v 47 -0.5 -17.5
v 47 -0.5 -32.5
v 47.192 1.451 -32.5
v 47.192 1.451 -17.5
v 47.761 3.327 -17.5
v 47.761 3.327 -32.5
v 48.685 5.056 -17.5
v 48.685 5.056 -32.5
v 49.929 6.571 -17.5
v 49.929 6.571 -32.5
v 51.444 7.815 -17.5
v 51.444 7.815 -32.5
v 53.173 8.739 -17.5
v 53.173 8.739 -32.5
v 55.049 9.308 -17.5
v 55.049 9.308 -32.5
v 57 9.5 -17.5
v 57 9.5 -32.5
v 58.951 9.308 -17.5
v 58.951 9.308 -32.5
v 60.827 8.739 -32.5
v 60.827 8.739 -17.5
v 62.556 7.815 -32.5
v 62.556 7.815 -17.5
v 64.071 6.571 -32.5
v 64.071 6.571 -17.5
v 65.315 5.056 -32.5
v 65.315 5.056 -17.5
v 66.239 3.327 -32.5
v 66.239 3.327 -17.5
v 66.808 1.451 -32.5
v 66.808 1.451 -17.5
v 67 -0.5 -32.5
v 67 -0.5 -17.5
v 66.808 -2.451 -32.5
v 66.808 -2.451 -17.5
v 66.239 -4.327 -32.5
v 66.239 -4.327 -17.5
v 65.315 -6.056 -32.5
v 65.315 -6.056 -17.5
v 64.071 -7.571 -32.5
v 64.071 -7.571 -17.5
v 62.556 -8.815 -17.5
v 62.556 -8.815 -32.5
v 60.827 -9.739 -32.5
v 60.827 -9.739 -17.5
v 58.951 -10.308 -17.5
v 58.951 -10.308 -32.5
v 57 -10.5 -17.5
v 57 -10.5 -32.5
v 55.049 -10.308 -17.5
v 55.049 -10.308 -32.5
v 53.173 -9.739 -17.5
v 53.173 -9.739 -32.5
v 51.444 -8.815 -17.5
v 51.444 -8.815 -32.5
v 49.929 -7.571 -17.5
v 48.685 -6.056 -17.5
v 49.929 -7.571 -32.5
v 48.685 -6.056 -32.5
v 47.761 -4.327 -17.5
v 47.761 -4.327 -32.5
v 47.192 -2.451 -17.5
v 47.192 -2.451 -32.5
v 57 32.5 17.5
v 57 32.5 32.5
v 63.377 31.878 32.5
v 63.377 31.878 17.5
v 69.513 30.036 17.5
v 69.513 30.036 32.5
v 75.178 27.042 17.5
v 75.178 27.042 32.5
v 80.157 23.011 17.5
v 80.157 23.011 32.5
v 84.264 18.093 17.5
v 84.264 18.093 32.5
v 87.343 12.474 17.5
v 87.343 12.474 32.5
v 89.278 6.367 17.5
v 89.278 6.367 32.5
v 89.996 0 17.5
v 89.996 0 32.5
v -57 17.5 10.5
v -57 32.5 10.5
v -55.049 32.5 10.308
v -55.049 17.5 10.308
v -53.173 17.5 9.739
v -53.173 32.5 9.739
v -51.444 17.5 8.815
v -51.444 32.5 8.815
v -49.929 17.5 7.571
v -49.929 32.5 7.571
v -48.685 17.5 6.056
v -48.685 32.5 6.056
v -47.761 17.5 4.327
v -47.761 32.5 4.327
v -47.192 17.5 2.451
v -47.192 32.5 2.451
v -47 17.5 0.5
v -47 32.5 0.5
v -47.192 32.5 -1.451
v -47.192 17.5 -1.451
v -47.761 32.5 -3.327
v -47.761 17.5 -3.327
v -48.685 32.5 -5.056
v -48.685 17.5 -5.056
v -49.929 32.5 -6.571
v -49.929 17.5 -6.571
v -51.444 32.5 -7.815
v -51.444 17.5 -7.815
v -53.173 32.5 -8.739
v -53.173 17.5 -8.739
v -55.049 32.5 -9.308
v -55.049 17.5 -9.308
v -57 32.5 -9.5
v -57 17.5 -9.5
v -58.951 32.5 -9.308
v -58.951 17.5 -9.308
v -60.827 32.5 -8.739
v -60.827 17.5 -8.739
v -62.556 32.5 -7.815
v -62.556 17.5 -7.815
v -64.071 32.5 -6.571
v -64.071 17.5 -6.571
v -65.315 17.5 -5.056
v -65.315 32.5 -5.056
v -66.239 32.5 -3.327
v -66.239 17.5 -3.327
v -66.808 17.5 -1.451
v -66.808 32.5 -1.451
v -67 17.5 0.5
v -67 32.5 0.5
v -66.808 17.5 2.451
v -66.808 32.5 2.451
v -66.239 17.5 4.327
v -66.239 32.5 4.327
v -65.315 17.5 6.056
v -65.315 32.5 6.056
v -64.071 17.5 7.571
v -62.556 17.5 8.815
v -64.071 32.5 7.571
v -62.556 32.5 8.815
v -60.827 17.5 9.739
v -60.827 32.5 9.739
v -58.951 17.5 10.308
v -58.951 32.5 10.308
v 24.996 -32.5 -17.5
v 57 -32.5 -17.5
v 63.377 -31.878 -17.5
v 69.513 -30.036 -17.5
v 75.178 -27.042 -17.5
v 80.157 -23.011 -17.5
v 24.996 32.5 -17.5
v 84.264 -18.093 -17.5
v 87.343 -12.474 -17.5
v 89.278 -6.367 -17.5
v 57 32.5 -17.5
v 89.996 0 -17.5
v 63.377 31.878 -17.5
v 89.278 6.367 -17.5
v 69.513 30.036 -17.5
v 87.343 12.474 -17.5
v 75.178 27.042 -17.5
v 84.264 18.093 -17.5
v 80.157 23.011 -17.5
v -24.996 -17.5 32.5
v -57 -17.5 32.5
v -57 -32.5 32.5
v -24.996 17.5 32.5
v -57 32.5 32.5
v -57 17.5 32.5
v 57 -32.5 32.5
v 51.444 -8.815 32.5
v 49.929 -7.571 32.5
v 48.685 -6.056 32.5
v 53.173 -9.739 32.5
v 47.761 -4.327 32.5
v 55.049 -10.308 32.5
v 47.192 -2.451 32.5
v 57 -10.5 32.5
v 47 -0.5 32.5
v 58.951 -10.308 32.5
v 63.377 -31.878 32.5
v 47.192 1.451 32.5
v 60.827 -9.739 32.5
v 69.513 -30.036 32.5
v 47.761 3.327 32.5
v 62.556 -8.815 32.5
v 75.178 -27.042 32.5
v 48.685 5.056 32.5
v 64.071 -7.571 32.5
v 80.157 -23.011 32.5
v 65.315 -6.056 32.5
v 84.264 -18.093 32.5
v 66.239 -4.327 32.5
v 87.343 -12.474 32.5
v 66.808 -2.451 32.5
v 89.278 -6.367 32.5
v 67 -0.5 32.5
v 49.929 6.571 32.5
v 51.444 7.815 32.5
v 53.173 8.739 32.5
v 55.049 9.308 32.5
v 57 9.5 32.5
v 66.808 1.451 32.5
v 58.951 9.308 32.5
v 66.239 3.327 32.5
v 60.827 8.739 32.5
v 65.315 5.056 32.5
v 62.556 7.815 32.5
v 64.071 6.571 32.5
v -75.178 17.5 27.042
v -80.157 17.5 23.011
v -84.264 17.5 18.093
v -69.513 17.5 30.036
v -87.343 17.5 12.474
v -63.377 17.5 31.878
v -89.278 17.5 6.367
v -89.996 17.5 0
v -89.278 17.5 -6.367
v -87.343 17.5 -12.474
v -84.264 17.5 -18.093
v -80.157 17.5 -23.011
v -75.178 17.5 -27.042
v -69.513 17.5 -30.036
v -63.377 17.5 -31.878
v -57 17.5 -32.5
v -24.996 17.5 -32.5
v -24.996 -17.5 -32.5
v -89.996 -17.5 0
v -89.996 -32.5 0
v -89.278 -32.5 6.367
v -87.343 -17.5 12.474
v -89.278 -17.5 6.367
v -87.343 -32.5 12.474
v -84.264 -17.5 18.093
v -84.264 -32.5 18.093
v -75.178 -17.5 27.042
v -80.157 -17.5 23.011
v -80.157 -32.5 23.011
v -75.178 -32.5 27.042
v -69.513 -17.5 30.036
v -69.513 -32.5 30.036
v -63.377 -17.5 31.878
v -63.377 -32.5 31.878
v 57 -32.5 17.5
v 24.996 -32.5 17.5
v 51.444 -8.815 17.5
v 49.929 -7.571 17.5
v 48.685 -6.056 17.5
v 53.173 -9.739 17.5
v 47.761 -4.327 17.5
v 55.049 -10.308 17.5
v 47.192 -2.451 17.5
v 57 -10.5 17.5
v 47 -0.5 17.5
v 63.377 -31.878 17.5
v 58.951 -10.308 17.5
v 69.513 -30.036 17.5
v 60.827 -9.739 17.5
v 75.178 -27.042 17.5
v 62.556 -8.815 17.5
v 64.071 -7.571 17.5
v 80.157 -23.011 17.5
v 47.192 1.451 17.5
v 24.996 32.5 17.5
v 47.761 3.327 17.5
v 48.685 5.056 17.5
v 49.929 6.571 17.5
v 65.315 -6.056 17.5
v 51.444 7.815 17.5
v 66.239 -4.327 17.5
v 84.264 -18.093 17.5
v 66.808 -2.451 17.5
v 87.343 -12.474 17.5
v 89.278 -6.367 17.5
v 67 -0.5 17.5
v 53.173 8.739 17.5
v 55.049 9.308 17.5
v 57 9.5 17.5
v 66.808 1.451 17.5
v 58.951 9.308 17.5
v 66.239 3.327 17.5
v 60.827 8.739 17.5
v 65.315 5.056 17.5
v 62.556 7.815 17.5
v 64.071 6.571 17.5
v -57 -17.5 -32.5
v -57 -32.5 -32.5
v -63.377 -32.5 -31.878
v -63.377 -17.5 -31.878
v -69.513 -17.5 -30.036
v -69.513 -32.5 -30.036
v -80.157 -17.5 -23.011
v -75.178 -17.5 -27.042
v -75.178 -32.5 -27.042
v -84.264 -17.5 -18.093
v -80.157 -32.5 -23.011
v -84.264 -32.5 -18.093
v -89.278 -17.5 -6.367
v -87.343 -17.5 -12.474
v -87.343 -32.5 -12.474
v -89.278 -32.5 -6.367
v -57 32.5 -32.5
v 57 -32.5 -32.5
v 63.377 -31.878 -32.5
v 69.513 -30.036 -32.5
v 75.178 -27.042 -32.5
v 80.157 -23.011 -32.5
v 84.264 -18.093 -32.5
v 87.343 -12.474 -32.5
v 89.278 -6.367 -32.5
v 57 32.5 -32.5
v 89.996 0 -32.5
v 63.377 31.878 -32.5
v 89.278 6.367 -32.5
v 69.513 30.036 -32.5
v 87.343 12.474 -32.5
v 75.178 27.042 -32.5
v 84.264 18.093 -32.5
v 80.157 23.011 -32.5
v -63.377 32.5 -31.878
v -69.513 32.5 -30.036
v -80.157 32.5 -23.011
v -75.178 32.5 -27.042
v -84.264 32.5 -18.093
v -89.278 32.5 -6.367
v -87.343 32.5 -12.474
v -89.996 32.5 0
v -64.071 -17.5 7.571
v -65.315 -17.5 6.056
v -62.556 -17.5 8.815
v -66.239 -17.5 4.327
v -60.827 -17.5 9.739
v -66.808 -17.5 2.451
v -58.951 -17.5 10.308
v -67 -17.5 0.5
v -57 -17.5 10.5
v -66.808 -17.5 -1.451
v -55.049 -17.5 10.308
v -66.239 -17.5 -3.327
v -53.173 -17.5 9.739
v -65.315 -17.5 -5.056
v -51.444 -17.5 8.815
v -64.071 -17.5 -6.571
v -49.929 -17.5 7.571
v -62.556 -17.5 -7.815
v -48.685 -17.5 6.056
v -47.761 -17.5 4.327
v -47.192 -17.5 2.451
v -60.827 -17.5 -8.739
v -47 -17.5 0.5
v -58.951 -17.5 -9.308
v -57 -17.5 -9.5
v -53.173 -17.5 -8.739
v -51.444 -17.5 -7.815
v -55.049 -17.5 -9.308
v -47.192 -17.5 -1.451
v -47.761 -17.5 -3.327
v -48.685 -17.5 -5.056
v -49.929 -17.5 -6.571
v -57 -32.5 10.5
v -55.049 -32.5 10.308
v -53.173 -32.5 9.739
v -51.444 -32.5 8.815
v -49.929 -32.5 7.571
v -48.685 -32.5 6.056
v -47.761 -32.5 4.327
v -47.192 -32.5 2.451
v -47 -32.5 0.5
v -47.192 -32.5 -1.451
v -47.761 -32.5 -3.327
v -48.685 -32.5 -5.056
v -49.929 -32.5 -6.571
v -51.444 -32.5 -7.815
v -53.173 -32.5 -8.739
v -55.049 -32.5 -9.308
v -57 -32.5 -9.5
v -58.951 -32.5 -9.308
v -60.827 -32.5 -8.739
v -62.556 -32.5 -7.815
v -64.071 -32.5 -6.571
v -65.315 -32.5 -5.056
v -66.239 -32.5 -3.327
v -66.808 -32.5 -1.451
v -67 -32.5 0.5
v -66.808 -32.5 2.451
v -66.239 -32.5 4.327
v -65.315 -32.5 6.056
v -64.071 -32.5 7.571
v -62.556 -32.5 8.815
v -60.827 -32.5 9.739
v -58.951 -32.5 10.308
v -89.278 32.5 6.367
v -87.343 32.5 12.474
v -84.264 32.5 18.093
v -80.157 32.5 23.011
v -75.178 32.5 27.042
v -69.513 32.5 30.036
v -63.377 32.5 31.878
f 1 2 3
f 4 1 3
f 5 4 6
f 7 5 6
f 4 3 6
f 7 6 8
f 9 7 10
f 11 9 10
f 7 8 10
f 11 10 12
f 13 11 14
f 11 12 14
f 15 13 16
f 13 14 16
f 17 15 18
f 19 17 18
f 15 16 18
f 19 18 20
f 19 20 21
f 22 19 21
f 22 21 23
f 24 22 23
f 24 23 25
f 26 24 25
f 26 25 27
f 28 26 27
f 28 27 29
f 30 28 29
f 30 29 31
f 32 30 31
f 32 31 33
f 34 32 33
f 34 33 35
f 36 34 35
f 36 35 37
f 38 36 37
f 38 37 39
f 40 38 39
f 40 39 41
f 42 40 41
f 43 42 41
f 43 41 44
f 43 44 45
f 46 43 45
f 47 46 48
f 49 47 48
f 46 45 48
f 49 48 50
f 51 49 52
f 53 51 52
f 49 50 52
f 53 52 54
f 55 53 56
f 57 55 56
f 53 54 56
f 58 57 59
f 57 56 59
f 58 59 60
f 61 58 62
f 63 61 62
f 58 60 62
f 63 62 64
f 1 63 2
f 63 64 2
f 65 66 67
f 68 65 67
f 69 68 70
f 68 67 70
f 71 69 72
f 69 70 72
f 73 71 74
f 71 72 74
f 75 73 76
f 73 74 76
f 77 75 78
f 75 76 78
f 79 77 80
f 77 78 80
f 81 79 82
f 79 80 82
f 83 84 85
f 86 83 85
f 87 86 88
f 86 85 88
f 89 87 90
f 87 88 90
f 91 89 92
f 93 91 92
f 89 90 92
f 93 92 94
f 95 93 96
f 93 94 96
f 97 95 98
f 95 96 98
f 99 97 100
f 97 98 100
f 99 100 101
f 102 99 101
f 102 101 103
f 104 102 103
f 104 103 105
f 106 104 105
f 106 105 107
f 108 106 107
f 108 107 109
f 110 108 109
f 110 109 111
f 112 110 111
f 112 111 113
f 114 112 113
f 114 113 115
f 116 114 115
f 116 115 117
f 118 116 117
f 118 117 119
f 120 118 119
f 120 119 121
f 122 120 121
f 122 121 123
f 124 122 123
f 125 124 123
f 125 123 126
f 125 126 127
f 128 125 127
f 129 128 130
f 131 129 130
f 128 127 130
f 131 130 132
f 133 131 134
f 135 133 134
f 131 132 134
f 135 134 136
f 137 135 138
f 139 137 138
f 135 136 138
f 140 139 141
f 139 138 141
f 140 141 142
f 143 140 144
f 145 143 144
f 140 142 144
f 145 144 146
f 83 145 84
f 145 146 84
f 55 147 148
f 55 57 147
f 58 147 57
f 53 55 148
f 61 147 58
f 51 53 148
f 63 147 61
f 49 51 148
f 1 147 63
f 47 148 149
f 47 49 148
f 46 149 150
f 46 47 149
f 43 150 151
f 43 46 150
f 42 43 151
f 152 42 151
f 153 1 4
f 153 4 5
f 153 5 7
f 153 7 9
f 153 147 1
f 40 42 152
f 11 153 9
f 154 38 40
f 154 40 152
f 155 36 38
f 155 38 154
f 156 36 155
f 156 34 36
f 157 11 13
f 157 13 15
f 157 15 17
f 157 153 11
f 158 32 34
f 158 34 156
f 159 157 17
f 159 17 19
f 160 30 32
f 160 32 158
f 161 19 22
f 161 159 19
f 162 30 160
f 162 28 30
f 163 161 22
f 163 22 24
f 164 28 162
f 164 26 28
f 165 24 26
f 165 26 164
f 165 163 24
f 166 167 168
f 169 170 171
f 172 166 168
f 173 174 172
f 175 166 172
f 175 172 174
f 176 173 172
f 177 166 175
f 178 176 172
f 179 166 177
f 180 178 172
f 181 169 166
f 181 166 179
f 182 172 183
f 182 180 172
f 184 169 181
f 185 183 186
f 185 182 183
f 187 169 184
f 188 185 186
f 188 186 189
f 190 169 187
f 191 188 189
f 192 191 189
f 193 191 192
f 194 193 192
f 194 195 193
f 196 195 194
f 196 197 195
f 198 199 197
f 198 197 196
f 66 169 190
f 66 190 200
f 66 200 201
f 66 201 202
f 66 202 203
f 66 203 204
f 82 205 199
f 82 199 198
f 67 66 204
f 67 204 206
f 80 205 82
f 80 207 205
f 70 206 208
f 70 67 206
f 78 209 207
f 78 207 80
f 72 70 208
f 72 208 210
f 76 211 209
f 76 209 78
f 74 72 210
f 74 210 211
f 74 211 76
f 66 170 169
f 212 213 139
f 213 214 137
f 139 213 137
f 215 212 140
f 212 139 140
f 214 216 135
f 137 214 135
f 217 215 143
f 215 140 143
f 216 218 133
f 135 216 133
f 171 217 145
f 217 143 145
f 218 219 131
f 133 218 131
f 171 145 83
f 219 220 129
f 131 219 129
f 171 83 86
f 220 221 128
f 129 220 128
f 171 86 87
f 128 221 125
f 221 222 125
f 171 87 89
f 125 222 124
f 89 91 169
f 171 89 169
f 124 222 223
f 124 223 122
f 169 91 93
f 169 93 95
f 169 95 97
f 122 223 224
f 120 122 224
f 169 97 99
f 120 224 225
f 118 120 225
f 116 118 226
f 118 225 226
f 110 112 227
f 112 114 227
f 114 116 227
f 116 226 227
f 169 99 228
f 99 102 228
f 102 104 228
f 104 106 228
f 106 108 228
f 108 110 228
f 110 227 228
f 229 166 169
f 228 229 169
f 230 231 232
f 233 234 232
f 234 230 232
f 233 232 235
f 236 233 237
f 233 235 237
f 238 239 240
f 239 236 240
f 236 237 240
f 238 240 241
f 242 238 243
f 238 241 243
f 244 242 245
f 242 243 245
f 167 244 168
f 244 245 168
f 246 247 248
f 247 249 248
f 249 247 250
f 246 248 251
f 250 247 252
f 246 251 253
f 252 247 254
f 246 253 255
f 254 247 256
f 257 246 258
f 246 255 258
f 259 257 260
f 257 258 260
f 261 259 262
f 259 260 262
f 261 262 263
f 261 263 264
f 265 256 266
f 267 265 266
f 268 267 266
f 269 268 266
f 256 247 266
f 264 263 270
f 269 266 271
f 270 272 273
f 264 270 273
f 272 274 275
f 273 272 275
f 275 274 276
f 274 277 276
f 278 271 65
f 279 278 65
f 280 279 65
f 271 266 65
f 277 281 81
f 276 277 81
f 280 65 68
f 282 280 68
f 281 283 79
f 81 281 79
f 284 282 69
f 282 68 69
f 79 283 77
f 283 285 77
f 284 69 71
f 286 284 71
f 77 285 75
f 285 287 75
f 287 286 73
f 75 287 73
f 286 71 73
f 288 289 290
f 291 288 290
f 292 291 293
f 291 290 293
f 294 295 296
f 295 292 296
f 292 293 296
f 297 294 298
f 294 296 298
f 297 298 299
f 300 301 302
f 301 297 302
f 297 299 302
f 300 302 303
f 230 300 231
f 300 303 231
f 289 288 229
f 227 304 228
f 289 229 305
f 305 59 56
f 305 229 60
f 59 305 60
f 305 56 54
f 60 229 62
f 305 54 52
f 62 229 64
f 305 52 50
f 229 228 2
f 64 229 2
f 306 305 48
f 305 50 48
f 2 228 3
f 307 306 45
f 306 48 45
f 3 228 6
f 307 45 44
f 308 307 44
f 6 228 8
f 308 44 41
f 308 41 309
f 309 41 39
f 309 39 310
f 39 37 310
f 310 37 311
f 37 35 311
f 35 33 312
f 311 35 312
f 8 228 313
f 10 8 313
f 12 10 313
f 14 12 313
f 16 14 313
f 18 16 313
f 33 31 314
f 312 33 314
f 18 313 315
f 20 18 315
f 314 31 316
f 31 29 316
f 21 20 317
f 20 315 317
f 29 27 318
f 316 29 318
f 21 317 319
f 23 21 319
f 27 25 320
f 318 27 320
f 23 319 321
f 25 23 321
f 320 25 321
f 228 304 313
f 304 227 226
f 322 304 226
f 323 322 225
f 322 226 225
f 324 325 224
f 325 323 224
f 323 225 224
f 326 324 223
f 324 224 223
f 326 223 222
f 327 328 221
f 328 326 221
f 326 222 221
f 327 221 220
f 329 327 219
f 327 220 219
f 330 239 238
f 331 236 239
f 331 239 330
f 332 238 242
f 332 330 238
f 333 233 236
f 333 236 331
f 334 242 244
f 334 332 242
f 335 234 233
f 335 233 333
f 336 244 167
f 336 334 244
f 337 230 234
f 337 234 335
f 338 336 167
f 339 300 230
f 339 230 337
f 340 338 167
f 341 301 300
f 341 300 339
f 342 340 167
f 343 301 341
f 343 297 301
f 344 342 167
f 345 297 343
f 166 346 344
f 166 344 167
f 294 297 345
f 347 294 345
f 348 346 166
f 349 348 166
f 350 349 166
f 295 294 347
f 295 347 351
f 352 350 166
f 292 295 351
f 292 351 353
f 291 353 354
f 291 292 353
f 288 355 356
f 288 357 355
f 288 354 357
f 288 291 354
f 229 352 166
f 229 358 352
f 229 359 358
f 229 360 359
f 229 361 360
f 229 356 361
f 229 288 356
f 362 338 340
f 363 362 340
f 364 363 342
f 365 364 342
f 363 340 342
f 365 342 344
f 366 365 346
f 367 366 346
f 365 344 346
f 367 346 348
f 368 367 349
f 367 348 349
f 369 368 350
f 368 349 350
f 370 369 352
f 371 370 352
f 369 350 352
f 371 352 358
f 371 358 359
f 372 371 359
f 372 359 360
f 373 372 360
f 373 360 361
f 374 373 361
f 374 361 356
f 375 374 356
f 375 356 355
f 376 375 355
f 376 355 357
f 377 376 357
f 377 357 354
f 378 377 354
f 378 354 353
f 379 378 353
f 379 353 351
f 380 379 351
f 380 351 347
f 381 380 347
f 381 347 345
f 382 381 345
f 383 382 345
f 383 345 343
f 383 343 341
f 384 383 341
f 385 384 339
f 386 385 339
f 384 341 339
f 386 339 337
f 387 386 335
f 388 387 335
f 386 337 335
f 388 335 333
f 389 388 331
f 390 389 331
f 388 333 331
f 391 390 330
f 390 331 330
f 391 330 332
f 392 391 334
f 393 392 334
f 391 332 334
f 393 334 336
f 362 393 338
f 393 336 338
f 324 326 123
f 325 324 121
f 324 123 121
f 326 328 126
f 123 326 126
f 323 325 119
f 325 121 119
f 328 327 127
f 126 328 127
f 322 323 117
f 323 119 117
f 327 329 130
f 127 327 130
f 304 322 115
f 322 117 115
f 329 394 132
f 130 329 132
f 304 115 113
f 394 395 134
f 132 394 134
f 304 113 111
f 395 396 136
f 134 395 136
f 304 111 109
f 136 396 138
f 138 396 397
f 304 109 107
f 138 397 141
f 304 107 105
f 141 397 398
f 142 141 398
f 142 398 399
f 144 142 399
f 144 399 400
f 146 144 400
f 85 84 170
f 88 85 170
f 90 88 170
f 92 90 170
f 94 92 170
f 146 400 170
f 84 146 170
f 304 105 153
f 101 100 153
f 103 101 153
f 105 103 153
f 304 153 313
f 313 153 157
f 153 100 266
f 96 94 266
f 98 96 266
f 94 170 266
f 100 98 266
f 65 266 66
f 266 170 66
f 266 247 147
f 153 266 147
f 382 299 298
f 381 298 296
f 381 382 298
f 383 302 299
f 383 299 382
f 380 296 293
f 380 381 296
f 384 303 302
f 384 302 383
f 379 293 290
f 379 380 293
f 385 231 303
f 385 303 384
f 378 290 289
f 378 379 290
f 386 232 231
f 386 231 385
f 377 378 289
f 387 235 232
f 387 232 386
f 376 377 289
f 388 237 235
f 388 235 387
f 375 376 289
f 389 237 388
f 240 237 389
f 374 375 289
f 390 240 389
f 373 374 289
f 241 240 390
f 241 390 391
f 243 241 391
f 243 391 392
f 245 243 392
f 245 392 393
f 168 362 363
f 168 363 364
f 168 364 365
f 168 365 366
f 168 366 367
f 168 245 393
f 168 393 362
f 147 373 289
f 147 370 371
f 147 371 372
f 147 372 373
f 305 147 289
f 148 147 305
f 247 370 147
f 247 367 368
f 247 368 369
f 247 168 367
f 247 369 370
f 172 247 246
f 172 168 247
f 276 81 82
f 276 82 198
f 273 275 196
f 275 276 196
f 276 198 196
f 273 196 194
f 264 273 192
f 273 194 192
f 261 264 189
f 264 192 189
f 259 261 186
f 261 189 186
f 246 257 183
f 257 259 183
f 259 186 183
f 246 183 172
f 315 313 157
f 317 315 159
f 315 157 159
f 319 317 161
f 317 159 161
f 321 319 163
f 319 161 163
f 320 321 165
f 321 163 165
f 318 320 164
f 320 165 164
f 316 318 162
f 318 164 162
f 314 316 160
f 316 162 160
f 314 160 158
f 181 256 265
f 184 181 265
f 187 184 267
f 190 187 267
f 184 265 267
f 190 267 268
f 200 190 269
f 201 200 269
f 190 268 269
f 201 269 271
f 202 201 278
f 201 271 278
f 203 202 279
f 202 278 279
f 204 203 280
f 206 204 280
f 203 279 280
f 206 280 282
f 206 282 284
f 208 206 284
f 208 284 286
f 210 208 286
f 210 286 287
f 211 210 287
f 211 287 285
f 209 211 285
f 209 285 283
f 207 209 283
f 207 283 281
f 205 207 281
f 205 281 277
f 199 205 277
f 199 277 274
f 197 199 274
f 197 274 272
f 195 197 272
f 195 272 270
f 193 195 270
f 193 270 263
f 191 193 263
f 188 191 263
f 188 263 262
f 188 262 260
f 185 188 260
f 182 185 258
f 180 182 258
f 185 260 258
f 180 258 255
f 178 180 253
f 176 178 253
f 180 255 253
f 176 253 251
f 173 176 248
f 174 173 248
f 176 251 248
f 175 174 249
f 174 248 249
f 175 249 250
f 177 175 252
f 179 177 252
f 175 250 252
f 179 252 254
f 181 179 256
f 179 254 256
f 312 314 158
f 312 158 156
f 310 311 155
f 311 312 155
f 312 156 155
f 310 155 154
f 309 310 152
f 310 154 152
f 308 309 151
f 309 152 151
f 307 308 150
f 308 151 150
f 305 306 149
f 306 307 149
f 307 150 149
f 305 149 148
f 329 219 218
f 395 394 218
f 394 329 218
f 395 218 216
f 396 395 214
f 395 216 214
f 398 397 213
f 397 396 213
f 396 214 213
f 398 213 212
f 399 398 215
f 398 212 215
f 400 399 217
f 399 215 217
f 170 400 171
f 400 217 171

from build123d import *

# Parameters (mm, degrees)
ESBO_O1_W                  = 180
ESBO_O1_H                  = 65
RESSALTO_EXTRUS_O2_DEPTH   = 32.5
FILETE1_R                  = 33
CORTE_EXTRUS_O1_DEPTH      = 102.056914657
CORTE_EXTRUS_O1_DEPTH_BACK = 102.056914657
ESBO_O2_W                  = 65
ESBO_O2_H                  = 35
FILETE4_R                  = 33
ESBO_O4_W                  = 65
ESBO_O4_H                  = 35
CORTE_EXTRUS_O2_DEPTH      = 116.674405799
ESBO_O5_R                  = 10
CORTE_EXTRUS_O3_DEPTH      = 116.674405799
ESBO_O6_R                  = 10
CORTE_EXTRUS_O4_DEPTH      = 116.674405799


with BuildPart() as part:
    # Esboço1 → Ressalto-extrusão2 (new, symmetric)
    with BuildSketch(Plane.XY):
        Rectangle(ESBO_O1_W, ESBO_O1_H)
    extrude(amount=RESSALTO_EXTRUS_O2_DEPTH, both=True)

    # Filete1
    # the kernel refuses this fillet: 33 mm, written as the material it takes off along each edge
    with BuildSketch(Plane(origin=(-90, -115, 32.5), x_dir=(1, 0, 0), z_dir=(0, 1, 0))) as filete1_piece_1:
        with BuildLine():
            CenterArc((FILETE1_R, FILETE1_R), FILETE1_R, 180, 90)
            Line((0, FILETE1_R), (0, 0))
            Line((0, 0), (FILETE1_R, 0))
        make_face()
    extrude(amount=230, mode=Mode.SUBTRACT)
    with BuildSketch(Plane(origin=(-90, -115, -32.5), x_dir=(1, 0, 0), z_dir=(0, 1, 0))) as filete1_piece_2:
        with BuildLine():
            CenterArc((FILETE1_R, -FILETE1_R), FILETE1_R, 90, 90)
            Line((0, -FILETE1_R), (0, 0))
            Line((0, 0), (FILETE1_R, 0))
        make_face()
    extrude(amount=230, mode=Mode.SUBTRACT)

    # Esboço2 → Corte-extrusão1 (cut, two sides: drawn at the far end of the back side and taken through both)
    with BuildSketch(Plane.XY.offset(-CORTE_EXTRUS_O1_DEPTH_BACK)):
        with Locations((-57.496211904, 0)):
            Rectangle(ESBO_O2_W, ESBO_O2_H)
    extrude(amount=CORTE_EXTRUS_O1_DEPTH + CORTE_EXTRUS_O1_DEPTH_BACK, mode=Mode.SUBTRACT)

    # Filete4
    # the kernel refuses this fillet: 33 mm, written as the material it takes off along each edge
    with BuildSketch(Plane(origin=(90, -32.5, 115), x_dir=(0, 1, 0), z_dir=(0, 0, -1)), Plane(origin=(90, 32.5, 115), x_dir=(-1, 0, 0), z_dir=(0, 0, -1))) as filete4_piece_1:
        with BuildLine():
            CenterArc((FILETE4_R, -FILETE4_R), FILETE4_R, 90, 90)
            Line((0, -FILETE4_R), (0, 0))
            Line((0, 0), (FILETE4_R, 0))
        make_face()
    extrude(amount=230, mode=Mode.SUBTRACT)

    # Esboço4 → Corte-extrusão2 (cut, through all)
    with BuildSketch(Plane(origin=(0, 32.5, 0), x_dir=(1, 0, 0), z_dir=(0, 1, 0))):
        with Locations((57.496211904, 0)):
            Rectangle(ESBO_O4_W, ESBO_O4_H)
    extrude(amount=-CORTE_EXTRUS_O2_DEPTH, mode=Mode.SUBTRACT)

    # Esboço5 → Corte-extrusão3 (cut, through all)
    with BuildSketch(Plane(origin=(0, 0, -32.5), x_dir=(-1, 0, 0), z_dir=(0, 0, -1))):
        with Locations((-57, -0.5)):
            Circle(ESBO_O5_R)
    extrude(amount=-CORTE_EXTRUS_O3_DEPTH, mode=Mode.SUBTRACT)

    # Esboço6 → Corte-extrusão4 (cut, through all)
    with BuildSketch(Plane(origin=(0, 32.5, 0), x_dir=(1, 0, 0), z_dir=(0, 1, 0))):
        with Locations(Location((-57, -0.5, 0), (0, 0, 270))):
            Circle(ESBO_O6_R)
    extrude(amount=-CORTE_EXTRUS_O4_DEPTH, mode=Mode.SUBTRACT)


solid = part.part
